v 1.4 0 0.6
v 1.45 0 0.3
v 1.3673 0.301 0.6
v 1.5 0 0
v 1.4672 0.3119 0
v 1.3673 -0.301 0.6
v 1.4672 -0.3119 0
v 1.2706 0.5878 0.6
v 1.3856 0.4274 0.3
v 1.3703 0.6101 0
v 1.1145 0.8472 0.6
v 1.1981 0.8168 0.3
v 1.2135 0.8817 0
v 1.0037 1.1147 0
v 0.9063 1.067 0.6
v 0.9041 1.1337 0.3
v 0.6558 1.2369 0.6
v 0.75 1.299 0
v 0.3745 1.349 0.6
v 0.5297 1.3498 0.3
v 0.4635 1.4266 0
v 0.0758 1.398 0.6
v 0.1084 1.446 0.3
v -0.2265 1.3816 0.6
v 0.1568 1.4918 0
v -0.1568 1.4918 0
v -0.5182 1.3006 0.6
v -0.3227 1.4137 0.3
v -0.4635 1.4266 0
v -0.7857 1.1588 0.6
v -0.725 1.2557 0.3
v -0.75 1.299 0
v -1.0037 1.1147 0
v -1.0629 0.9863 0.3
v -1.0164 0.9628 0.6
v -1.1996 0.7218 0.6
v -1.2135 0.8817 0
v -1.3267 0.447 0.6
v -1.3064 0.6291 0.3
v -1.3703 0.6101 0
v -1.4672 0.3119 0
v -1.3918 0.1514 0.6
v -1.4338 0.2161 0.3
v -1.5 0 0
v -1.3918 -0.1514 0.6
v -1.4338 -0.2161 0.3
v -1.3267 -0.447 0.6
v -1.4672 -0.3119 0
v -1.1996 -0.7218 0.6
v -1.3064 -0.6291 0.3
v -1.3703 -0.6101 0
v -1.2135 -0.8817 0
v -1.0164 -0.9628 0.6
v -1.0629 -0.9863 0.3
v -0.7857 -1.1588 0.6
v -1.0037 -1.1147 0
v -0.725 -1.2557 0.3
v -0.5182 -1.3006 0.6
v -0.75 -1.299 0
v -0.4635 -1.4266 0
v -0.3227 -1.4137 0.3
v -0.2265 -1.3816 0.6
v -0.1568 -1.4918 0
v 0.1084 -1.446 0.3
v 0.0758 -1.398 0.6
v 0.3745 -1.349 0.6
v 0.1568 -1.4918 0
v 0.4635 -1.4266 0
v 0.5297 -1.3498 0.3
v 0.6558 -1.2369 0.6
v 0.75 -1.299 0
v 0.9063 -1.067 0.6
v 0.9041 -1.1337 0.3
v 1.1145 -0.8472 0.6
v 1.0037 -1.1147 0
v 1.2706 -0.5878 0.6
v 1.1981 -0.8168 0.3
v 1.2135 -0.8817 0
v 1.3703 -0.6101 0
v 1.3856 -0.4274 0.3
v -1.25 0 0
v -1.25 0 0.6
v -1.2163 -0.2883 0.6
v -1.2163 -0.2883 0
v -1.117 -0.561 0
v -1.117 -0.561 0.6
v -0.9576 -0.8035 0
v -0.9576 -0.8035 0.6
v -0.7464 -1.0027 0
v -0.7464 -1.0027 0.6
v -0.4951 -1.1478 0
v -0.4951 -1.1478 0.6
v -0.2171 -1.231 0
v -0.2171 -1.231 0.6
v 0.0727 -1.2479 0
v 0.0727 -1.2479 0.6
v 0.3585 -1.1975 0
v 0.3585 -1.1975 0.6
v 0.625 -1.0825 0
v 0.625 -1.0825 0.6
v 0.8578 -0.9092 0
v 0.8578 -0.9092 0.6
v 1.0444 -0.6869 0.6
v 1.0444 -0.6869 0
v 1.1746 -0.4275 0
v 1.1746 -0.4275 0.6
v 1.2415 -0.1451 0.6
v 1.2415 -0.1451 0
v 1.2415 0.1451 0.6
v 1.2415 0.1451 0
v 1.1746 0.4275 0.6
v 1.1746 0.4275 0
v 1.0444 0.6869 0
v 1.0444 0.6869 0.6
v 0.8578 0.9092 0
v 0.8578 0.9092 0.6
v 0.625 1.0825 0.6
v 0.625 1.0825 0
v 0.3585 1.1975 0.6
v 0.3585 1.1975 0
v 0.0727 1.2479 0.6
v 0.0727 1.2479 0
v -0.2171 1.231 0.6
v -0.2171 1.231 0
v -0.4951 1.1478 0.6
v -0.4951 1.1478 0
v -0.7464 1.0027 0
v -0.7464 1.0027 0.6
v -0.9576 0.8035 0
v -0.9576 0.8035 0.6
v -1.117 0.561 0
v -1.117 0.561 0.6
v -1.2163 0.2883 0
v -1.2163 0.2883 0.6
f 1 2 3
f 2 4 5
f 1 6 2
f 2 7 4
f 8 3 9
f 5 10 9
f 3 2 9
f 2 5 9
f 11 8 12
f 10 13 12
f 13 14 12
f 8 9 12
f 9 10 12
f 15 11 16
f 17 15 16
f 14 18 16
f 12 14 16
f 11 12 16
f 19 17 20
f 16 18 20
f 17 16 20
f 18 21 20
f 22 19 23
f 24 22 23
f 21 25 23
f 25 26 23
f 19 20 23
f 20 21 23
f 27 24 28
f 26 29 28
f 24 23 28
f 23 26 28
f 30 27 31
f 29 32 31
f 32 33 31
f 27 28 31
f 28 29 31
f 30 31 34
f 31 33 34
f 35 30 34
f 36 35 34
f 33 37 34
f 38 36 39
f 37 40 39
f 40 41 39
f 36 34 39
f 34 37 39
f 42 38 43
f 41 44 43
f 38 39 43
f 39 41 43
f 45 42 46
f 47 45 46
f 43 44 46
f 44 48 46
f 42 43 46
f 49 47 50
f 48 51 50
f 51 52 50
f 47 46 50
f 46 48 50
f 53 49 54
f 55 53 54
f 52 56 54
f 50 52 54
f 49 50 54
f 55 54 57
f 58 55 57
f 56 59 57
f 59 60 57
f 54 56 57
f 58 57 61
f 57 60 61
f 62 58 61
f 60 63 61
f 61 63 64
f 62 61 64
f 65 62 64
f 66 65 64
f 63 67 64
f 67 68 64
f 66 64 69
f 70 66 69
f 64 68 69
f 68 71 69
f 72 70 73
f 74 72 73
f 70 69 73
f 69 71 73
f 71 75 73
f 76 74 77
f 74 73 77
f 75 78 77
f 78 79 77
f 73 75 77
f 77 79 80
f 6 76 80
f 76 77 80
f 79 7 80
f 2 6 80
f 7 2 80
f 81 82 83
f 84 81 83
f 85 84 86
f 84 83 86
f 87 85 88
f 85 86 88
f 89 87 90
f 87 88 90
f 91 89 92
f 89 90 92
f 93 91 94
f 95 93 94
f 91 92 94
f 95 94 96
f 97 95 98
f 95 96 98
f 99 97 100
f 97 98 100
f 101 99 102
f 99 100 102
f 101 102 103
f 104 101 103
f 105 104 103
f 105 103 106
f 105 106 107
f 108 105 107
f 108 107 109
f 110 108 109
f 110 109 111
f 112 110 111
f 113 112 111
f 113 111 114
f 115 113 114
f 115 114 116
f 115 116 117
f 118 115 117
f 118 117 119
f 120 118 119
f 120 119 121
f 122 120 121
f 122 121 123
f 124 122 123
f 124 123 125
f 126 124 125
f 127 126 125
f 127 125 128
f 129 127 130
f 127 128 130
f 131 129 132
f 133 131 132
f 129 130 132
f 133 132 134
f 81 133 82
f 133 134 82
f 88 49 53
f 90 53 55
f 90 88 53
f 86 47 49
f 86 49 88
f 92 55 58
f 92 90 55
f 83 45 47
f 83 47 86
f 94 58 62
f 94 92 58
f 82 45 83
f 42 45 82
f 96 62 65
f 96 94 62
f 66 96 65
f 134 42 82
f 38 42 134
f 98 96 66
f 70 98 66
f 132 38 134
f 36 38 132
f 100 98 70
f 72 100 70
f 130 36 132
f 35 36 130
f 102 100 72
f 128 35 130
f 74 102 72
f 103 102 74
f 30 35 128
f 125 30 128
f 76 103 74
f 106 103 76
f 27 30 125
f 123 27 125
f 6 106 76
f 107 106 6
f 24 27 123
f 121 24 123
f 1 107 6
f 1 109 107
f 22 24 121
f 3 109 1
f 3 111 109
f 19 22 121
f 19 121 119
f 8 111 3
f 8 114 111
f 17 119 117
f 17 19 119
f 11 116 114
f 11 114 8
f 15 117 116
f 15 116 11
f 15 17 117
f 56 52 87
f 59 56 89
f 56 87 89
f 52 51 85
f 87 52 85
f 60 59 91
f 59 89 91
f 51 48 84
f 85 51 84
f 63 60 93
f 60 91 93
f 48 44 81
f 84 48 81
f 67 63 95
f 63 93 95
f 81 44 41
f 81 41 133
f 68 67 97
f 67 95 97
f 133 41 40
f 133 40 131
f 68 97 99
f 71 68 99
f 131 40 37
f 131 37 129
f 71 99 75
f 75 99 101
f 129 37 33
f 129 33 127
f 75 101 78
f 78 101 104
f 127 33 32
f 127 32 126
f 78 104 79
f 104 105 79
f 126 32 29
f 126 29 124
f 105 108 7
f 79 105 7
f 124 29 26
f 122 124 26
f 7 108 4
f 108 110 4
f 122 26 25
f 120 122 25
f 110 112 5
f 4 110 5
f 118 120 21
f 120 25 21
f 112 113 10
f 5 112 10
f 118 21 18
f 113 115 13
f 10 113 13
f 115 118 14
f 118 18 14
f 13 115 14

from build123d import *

# Parameters (mm, degrees)
F0_R     = 1.5
F1_DEPTH = 0.6
F2_D     = 2.5
F3_SIZE2 = 0.59999
F3_SIZE  = 0.09999


# Not quite as in the source:
# - a fillet or chamfer is up to 0.001 mm smaller than in the source, because OpenCascade refuses the exact size


with BuildPart() as f1:
    # F0 (on Top) → F1 (new body)
    with BuildSketch(Plane.XY):
        Circle(F0_R)
    extrude(amount=F1_DEPTH)

    # F2 (through all)
    with Locations(Plane(origin=(0, 0, 0), x_dir=(1, 0, 0), z_dir=(0, 0, -1))):
        with Locations((0, 0)):
            Hole(F2_D / 2)

    # F3 (size 0.1 and 0.6 in the source; OpenCascade refuses exactly that, so slightly less here)
    f3_edges = [f1.edges().sort_by_distance(p)[0] for p in [
        (-1.5, 0, 0.6),
    ]]
    f3_side = f1.faces().sort_by_distance((-1.457574, 0, 0.6))[0]
    chamfer(f3_edges, length=F3_SIZE, length2=F3_SIZE2, reference=f3_side)


solid = f1.part
